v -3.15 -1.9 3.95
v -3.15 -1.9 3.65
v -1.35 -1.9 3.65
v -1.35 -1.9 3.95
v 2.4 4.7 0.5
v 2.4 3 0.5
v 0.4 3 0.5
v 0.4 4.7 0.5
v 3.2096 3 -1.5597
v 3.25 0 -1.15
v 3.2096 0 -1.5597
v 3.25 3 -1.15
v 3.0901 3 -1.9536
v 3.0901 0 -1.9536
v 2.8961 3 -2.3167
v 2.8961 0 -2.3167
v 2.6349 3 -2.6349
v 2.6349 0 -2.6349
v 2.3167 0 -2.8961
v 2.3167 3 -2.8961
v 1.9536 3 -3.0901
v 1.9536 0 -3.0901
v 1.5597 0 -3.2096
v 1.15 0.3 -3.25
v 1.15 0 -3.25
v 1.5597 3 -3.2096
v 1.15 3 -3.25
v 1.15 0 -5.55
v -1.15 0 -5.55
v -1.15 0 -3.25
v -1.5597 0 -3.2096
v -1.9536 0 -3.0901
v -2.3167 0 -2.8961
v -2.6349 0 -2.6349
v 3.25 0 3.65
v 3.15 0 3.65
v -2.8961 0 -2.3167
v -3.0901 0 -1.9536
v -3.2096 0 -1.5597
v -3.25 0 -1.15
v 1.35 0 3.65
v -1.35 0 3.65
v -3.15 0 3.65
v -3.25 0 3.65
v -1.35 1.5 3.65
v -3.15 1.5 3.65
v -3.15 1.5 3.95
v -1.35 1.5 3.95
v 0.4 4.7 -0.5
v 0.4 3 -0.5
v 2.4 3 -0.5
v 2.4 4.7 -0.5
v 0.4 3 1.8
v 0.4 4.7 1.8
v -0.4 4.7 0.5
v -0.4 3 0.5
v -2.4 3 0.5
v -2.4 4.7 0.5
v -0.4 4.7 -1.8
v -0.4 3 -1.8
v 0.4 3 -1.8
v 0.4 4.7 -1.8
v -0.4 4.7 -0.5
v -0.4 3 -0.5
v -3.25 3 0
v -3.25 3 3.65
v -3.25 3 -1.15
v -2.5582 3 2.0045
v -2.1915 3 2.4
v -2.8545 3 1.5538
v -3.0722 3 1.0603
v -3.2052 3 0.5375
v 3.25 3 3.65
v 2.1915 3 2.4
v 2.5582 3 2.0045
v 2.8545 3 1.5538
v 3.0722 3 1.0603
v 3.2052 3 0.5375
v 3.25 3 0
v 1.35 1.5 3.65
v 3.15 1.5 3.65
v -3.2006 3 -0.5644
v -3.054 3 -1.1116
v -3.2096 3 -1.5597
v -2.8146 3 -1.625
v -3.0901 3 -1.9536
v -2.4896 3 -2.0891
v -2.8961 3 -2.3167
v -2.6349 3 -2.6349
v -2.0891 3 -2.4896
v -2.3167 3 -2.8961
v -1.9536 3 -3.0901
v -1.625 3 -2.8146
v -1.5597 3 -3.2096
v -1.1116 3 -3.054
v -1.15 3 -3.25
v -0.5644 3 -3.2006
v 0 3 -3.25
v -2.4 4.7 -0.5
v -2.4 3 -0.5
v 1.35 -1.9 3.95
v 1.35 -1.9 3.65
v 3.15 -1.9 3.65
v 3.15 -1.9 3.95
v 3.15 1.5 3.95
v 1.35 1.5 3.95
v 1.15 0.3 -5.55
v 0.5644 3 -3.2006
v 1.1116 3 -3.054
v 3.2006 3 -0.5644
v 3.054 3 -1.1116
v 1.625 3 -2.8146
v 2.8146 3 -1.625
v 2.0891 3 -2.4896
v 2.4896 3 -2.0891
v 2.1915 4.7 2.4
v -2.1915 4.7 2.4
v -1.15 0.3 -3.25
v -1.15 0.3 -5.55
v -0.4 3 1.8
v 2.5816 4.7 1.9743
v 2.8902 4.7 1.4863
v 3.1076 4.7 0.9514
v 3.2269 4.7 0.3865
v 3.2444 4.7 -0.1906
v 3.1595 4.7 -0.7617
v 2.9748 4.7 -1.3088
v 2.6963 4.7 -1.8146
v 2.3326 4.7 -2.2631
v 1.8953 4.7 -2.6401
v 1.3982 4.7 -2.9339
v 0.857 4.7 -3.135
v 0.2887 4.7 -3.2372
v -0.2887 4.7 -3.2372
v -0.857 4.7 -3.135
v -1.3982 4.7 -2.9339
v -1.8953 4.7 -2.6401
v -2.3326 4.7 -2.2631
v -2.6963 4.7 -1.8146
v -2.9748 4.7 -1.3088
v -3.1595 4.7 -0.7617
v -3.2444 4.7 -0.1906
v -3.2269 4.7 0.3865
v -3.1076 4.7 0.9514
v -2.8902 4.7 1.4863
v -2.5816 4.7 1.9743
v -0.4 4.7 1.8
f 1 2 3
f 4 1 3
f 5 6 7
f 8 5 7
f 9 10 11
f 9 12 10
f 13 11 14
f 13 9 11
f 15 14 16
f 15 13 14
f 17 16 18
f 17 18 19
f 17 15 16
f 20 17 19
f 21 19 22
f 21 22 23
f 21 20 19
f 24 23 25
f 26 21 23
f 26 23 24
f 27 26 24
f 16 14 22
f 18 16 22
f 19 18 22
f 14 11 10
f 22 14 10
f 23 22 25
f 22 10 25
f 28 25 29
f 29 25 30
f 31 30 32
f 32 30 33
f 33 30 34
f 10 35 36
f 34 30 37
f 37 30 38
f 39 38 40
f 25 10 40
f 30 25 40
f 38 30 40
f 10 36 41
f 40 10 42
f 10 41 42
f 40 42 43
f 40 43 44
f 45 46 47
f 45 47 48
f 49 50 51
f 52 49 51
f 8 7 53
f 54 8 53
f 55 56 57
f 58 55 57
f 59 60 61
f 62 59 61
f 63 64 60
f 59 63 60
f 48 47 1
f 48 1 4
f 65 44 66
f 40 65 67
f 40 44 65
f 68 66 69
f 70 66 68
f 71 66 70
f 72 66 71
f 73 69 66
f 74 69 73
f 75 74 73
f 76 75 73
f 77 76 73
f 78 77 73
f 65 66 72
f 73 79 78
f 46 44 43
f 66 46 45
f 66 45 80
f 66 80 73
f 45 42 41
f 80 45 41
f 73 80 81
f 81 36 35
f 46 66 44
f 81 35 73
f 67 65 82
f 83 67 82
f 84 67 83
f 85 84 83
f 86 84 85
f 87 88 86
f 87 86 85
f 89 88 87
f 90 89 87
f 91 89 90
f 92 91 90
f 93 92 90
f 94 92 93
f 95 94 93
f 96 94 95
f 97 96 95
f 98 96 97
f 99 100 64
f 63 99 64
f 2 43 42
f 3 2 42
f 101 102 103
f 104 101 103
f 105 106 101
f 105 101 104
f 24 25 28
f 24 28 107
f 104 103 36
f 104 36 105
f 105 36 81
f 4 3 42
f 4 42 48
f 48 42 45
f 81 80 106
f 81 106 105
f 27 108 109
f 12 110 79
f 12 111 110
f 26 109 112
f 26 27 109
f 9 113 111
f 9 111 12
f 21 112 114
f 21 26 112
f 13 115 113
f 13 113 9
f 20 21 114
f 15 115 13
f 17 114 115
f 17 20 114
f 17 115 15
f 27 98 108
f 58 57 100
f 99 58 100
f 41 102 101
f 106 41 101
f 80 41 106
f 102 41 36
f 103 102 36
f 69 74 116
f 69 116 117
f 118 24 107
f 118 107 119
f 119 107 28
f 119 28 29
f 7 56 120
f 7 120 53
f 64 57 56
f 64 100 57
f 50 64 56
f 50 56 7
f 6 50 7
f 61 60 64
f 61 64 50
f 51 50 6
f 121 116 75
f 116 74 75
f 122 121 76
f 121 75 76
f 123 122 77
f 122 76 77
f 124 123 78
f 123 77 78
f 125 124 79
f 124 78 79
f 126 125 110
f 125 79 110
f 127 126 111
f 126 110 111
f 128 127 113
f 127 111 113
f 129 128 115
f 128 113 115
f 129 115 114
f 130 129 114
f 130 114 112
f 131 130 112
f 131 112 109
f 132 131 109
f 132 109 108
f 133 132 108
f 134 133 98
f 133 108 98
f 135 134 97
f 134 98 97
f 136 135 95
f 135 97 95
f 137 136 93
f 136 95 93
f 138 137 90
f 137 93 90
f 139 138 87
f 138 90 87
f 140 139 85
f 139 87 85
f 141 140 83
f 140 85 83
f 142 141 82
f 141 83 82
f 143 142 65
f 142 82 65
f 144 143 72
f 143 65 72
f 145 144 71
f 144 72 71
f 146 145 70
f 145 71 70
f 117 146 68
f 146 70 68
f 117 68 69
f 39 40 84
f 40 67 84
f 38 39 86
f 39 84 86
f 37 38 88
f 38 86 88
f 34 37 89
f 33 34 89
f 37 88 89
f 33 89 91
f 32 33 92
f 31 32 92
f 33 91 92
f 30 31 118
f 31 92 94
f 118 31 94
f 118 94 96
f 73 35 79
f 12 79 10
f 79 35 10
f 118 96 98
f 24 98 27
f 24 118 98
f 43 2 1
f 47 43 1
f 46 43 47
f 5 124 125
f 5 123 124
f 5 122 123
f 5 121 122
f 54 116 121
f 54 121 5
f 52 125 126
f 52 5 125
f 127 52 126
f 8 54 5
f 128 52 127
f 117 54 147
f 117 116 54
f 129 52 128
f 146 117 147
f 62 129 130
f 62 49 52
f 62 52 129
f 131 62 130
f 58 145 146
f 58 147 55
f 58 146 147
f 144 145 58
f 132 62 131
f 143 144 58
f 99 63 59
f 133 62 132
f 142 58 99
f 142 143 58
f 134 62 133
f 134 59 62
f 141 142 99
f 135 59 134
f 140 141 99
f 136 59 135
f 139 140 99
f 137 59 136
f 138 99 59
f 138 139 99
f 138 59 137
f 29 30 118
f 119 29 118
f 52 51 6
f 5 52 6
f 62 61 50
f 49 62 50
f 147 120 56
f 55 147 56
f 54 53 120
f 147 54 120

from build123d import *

# Parameters (mm, degrees)
SKETCH_1_W          = 6.5
SKETCH_1_H          = 6.9
EXTRUDE_1_DEPTH     = 3
EXTRUDE_START       = 3
SKETCH_1_3_R        = 3.25
EXTRUDE_2_DEPTH     = 1.7
CUT_EXTRUDE_START   = 3
CUT_EXTRUDE_1_DEPTH = 1.7
FILLET_1_R          = 2.1
SKETCH_2_W          = 1.8
SKETCH_2_H          = 3.4
EXTRUDE_3_DEPTH     = 0.3
SKETCH_3_W          = 2.3
SKETCH_3_H          = 0.3
EXTRUDE_4_DEPTH     = 2.3


with BuildPart() as part:
    # 草图1 → 凸台-拉伸1 (new body)
    with BuildSketch(Plane(origin=(0, 0, 0), x_dir=(1, 0, 0), z_dir=(0, 1, 0))):
        with Locations((0, -0.2)):
            Rectangle(SKETCH_1_W, SKETCH_1_H)
    extrude(amount=EXTRUDE_1_DEPTH)

    # 草图1<3> → 凸台-拉伸2 (add)
    with BuildSketch(Plane(origin=(0, 0, 0), x_dir=(1, 0, 0), z_dir=(0, 1, 0)).offset(EXTRUDE_START)):
        with Locations(Location((0, 0, 0), (0, 0, 90))):
            Circle(SKETCH_1_3_R)
        Polygon((-2.4, -0.5), (-2.4, 0.5), (-0.4, 0.5), (-0.4, 1.8), (0.4, 1.8), (0.4, 0.5), (2.4, 0.5), (2.4, -0.5), (0.4, -0.5), (0.4, -1.8), (-0.4, -1.8), (-0.4, -0.5), align=None, mode=Mode.SUBTRACT)
    extrude(amount=EXTRUDE_2_DEPTH)

    # 草图1<4> → 切除-拉伸1 (cut)
    with BuildSketch(Plane(origin=(0, 0, 0), x_dir=(1, 0, 0), z_dir=(0, 1, 0)).offset(CUT_EXTRUDE_START)):
        with BuildLine():
            Line((2.1914607, -2.4), (-2.1914607, -2.4))
            ThreePointArc((-2.1914607, -2.4), (0, -3.25), (2.1914607, -2.4))
        make_face()
    extrude(amount=CUT_EXTRUDE_1_DEPTH, mode=Mode.SUBTRACT)

    # 圆角1
    fillet_1_edges = [part.edges().sort_by_distance(p)[0] for p in [
        (-3.25, 1.5, -3.25),
        (3.25, 1.5, -3.25),
    ]]
    fillet(fillet_1_edges, radius=FILLET_1_R)

    # 草图2 → 凸台-拉伸3 (add)
    with BuildSketch(Plane.XY.offset(3.65)):
        with Locations((-2.25, -0.2)):
            Rectangle(SKETCH_2_W, SKETCH_2_H)
        with Locations((2.25, -0.2)):
            Rectangle(SKETCH_2_W, SKETCH_2_H)
    extrude(amount=EXTRUDE_3_DEPTH)

    # 草图3 → 凸台-拉伸4 (add)
    with BuildSketch(Plane(origin=(0, 0, -3.25), x_dir=(-1, 0, 0), z_dir=(0, 0, -1))):
        with Locations((0, 0.15)):
            Rectangle(SKETCH_3_W, SKETCH_3_H)
    extrude(amount=EXTRUDE_4_DEPTH)


solid = part.part
